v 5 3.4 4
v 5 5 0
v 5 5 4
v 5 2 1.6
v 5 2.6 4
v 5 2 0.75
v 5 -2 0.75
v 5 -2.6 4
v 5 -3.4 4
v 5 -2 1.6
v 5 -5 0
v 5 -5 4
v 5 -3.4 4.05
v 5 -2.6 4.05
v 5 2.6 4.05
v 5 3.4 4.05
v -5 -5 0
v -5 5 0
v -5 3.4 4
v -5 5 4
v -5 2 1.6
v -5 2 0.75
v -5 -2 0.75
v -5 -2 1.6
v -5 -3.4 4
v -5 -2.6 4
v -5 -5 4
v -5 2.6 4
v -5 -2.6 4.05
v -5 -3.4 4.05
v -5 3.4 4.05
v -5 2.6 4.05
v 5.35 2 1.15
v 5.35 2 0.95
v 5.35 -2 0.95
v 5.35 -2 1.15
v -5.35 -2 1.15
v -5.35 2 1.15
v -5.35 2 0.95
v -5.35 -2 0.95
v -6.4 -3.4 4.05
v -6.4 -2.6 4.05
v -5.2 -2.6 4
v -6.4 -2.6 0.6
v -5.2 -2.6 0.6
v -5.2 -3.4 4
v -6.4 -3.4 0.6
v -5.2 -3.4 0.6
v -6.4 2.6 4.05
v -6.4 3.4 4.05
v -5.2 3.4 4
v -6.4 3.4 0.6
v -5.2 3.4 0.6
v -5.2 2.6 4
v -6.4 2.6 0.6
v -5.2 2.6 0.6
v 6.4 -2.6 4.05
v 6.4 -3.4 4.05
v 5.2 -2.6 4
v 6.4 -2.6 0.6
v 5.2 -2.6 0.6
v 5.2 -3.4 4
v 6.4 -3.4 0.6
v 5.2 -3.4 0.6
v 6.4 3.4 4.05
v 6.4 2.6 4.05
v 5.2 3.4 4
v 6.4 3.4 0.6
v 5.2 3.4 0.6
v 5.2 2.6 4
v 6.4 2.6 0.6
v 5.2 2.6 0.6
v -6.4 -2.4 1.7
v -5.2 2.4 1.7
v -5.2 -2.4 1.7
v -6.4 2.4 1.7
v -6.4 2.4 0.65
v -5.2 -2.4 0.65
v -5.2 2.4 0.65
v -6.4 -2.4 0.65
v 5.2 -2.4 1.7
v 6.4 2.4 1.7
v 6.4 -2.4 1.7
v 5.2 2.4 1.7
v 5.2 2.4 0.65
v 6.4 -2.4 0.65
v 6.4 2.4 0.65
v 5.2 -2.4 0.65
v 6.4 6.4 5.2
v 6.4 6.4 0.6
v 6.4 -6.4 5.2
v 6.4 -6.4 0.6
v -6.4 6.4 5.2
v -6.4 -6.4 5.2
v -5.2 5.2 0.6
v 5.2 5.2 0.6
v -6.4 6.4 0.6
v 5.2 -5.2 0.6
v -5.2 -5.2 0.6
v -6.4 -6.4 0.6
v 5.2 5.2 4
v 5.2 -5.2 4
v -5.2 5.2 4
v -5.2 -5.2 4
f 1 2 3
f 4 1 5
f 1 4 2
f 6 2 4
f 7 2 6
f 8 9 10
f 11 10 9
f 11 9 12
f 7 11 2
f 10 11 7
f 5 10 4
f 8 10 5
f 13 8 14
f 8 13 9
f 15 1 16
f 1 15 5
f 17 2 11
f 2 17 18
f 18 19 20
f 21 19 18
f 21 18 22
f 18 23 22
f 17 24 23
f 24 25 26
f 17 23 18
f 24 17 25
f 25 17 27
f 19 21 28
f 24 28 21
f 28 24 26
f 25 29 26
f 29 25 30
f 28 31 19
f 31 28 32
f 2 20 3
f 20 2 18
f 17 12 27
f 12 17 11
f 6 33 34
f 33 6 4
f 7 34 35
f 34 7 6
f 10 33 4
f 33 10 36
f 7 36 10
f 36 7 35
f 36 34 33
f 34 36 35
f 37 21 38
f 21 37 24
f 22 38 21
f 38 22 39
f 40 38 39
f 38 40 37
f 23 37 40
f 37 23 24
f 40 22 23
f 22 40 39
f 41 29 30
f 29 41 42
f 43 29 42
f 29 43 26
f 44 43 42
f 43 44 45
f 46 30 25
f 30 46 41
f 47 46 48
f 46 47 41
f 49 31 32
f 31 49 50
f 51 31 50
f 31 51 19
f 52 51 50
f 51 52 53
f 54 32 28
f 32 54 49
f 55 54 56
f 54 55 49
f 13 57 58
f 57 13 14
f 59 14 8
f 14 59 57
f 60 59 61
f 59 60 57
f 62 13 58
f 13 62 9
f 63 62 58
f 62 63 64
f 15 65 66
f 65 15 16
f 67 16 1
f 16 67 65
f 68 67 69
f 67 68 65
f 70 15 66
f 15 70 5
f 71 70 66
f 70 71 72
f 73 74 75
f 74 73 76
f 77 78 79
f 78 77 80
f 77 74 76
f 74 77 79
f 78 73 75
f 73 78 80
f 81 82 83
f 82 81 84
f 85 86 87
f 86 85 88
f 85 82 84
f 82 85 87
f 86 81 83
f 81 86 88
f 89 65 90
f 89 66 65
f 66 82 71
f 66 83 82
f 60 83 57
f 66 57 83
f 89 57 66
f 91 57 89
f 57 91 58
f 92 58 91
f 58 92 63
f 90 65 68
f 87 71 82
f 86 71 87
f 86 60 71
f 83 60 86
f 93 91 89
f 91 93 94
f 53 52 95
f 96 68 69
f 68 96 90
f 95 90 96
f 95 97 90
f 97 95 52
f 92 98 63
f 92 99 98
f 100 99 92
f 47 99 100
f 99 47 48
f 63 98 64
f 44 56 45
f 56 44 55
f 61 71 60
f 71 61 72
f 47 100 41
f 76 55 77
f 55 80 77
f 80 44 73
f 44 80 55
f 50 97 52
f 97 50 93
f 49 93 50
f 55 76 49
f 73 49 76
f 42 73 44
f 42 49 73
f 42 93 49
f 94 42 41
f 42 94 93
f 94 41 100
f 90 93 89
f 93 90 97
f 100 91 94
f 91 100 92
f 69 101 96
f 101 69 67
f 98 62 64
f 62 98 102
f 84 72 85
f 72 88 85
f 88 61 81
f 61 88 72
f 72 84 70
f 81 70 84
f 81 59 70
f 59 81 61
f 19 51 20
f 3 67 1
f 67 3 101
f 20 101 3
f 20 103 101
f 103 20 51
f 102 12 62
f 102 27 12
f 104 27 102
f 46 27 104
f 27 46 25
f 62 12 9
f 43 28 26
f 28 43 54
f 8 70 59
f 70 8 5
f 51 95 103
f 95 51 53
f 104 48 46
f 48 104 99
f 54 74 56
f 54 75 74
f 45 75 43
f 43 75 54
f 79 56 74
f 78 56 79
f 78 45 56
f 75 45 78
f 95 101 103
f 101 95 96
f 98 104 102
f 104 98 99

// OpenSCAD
// file: ../lib/at01_inverted_core_snap.scad
// File: at01_inverted_core_snap.scad
// AT-01 — experiment-owned inverted fixed-core / removable-shell snap.
//
// This geometry does not copy the QuackWorks/OpenGrid snap. It keeps only the
// high-level design lessons: compact fixed side, removable compliant side,
// explicit locating/retention roles, and a Lite-like 4.0 / 3.4 mm Z baseline.

// Fixed-side baseline.
AT01_CORE_SIZE = 10.0;
AT01_CORE_HEIGHT = 4.0;
AT01_ROOT_SHOULDER = 0.6;
AT01_ENGAGEMENT_HEIGHT = 3.4;

// Removable shell.
AT01_CLEARANCE = 0.20;              // per side on nominal 10 x 10 core
AT01_SHELL_WALL = 1.20;
AT01_SHELL_TOP = 1.20;
AT01_SHELL_INNER = AT01_CORE_SIZE + 2 * AT01_CLEARANCE;
AT01_SHELL_OUTER = AT01_SHELL_INNER + 2 * AT01_SHELL_WALL;
AT01_SHELL_HEIGHT = AT01_ENGAGEMENT_HEIGHT + AT01_SHELL_TOP;

// Two-sided retention on +/-X.
AT01_RIB_PROTRUSION = 0.35;
AT01_RIB_WIDTH = 4.0;
AT01_RIB_Z_BOTTOM = 0.75;
AT01_RIB_Z_LOWER_MAX = 0.95;
AT01_RIB_Z_UPPER_MAX = 1.15;
AT01_RIB_Z_TOP = 1.60;

// Receiving window in each compliant shell tongue.
// Values are shell-local; assembled shell starts at Z=AT01_ROOT_SHOULDER.
AT01_WINDOW_WIDTH = 4.8;
AT01_WINDOW_Z_MIN = 0.05;
AT01_WINDOW_Z_MAX = 1.10;

// Two relief slots isolate the center tongue on each +/-X wall.
AT01_FLEX_SLOT_Y = 3.0;
AT01_FLEX_SLOT_WIDTH = 0.8;

// Evidence helpers.
AT01_EXPLODED_Z = 8.0;
AT01_PROFILE_SLICE = 1.0;

assert(
    abs(AT01_ROOT_SHOULDER + AT01_ENGAGEMENT_HEIGHT - AT01_CORE_HEIGHT) < 0.0001,
    "AT-01 Lite baseline must satisfy shoulder + engagement = 4.0 mm."
);
assert(
    abs(AT01_SHELL_INNER - (AT01_CORE_SIZE + 2 * AT01_CLEARANCE)) < 0.0001,
    "AT-01 shell inner size must preserve the stated side clearance."
);

module _at01_positive_x_retention_rib() {
    // Polygon is defined in X/Z and extruded along Y.
    rotate([90, 0, 0])
        linear_extrude(height = AT01_RIB_WIDTH, center = true, convexity = 10)
            polygon(points = [
                [AT01_CORE_SIZE / 2, AT01_RIB_Z_BOTTOM],
                [AT01_CORE_SIZE / 2 + AT01_RIB_PROTRUSION, AT01_RIB_Z_LOWER_MAX],
                [AT01_CORE_SIZE / 2 + AT01_RIB_PROTRUSION, AT01_RIB_Z_UPPER_MAX],
                [AT01_CORE_SIZE / 2, AT01_RIB_Z_TOP]
            ]);
}

module at01_fixed_core() {
    union() {
        translate([-AT01_CORE_SIZE / 2, -AT01_CORE_SIZE / 2, 0])
            cube([AT01_CORE_SIZE, AT01_CORE_SIZE, AT01_CORE_HEIGHT]);

        _at01_positive_x_retention_rib();

        mirror([1, 0, 0])
            _at01_positive_x_retention_rib();
    }
}

module _at01_shell_outer() {
    translate([-AT01_SHELL_OUTER / 2, -AT01_SHELL_OUTER / 2, 0])
        cube([AT01_SHELL_OUTER, AT01_SHELL_OUTER, AT01_SHELL_HEIGHT]);
}

module _at01_shell_cavity() {
    // Ends exactly at the underside of the top plate.
    translate([-AT01_SHELL_INNER / 2, -AT01_SHELL_INNER / 2, -0.05])
        cube([AT01_SHELL_INNER, AT01_SHELL_INNER, AT01_ENGAGEMENT_HEIGHT + 0.05]);
}

module _at01_retention_window(x_sign = 1) {
    wall_center = (AT01_SHELL_INNER / 2 + AT01_SHELL_OUTER / 2) / 2;
    translate([
        x_sign * wall_center,
        0,
        (AT01_WINDOW_Z_MIN + AT01_WINDOW_Z_MAX) / 2
    ])
        cube([
            AT01_SHELL_WALL + 0.4,
            AT01_WINDOW_WIDTH,
            AT01_WINDOW_Z_MAX - AT01_WINDOW_Z_MIN
        ], center = true);
}

module _at01_flex_slot(x_sign = 1, y_sign = 1) {
    wall_center = (AT01_SHELL_INNER / 2 + AT01_SHELL_OUTER / 2) / 2;
    translate([
        x_sign * wall_center,
        y_sign * AT01_FLEX_SLOT_Y,
        AT01_ENGAGEMENT_HEIGHT / 2
    ])
        cube([
            AT01_SHELL_WALL + 0.4,
            AT01_FLEX_SLOT_WIDTH,
            AT01_ENGAGEMENT_HEIGHT + 0.10
        ], center = true);
}

module at01_removable_shell() {
    difference() {
        _at01_shell_outer();
        _at01_shell_cavity();

        for (x_sign = [-1, 1]) {
            _at01_retention_window(x_sign);

            for (y_sign = [-1, 1])
                _at01_flex_slot(x_sign, y_sign);
        }
    }
}

module at01_assembled(shell_alpha = 0.55) {
    color([0.68, 0.70, 0.74])
        at01_fixed_core();

    translate([0, 0, AT01_ROOT_SHOULDER])
        color([0.92, 0.30, 0.12, shell_alpha])
            at01_removable_shell();
}

module at01_exploded() {
    color([0.68, 0.70, 0.74])
        at01_fixed_core();

    translate([0, 0, AT01_ROOT_SHOULDER + AT01_EXPLODED_Z])
        color([0.92, 0.30, 0.12])
            at01_removable_shell();
}

module _at01_retention_slice_volume() {
    translate([-20, -AT01_PROFILE_SLICE / 2, -1])
        cube([40, AT01_PROFILE_SLICE, 12]);
}

module _at01_locating_slice_volume() {
    translate([-AT01_PROFILE_SLICE / 2, -20, -1])
        cube([AT01_PROFILE_SLICE, 40, 12]);
}

module at01_fixed_retention_profile() {
    intersection() {
        at01_fixed_core();
        _at01_retention_slice_volume();
    }
}

module at01_shell_retention_profile() {
    intersection() {
        at01_removable_shell();
        translate([0, 0, -AT01_ROOT_SHOULDER])
            _at01_retention_slice_volume();
    }
}

module at01_fixed_locating_profile() {
    intersection() {
        at01_fixed_core();
        _at01_locating_slice_volume();
    }
}

module at01_shell_locating_profile() {
    intersection() {
        at01_removable_shell();
        translate([0, 0, -AT01_ROOT_SHOULDER])
            _at01_locating_slice_volume();
    }
}

module at01_retention_section() {
    color([0.68, 0.70, 0.74])
        at01_fixed_retention_profile();

    translate([0, 0, AT01_ROOT_SHOULDER])
        color([0.92, 0.30, 0.12])
            at01_shell_retention_profile();
}

module at01_locating_section() {
    color([0.68, 0.70, 0.74])
        at01_fixed_locating_profile();

    translate([0, 0, AT01_ROOT_SHOULDER])
        color([0.92, 0.30, 0.12])
            at01_shell_locating_profile();
}
// main file
include <../lib/at01_inverted_core_snap.scad>
$vpt=[0,0,2.6]; $vpr=[68,0,35]; $vpd=52;
at01_assembled();
